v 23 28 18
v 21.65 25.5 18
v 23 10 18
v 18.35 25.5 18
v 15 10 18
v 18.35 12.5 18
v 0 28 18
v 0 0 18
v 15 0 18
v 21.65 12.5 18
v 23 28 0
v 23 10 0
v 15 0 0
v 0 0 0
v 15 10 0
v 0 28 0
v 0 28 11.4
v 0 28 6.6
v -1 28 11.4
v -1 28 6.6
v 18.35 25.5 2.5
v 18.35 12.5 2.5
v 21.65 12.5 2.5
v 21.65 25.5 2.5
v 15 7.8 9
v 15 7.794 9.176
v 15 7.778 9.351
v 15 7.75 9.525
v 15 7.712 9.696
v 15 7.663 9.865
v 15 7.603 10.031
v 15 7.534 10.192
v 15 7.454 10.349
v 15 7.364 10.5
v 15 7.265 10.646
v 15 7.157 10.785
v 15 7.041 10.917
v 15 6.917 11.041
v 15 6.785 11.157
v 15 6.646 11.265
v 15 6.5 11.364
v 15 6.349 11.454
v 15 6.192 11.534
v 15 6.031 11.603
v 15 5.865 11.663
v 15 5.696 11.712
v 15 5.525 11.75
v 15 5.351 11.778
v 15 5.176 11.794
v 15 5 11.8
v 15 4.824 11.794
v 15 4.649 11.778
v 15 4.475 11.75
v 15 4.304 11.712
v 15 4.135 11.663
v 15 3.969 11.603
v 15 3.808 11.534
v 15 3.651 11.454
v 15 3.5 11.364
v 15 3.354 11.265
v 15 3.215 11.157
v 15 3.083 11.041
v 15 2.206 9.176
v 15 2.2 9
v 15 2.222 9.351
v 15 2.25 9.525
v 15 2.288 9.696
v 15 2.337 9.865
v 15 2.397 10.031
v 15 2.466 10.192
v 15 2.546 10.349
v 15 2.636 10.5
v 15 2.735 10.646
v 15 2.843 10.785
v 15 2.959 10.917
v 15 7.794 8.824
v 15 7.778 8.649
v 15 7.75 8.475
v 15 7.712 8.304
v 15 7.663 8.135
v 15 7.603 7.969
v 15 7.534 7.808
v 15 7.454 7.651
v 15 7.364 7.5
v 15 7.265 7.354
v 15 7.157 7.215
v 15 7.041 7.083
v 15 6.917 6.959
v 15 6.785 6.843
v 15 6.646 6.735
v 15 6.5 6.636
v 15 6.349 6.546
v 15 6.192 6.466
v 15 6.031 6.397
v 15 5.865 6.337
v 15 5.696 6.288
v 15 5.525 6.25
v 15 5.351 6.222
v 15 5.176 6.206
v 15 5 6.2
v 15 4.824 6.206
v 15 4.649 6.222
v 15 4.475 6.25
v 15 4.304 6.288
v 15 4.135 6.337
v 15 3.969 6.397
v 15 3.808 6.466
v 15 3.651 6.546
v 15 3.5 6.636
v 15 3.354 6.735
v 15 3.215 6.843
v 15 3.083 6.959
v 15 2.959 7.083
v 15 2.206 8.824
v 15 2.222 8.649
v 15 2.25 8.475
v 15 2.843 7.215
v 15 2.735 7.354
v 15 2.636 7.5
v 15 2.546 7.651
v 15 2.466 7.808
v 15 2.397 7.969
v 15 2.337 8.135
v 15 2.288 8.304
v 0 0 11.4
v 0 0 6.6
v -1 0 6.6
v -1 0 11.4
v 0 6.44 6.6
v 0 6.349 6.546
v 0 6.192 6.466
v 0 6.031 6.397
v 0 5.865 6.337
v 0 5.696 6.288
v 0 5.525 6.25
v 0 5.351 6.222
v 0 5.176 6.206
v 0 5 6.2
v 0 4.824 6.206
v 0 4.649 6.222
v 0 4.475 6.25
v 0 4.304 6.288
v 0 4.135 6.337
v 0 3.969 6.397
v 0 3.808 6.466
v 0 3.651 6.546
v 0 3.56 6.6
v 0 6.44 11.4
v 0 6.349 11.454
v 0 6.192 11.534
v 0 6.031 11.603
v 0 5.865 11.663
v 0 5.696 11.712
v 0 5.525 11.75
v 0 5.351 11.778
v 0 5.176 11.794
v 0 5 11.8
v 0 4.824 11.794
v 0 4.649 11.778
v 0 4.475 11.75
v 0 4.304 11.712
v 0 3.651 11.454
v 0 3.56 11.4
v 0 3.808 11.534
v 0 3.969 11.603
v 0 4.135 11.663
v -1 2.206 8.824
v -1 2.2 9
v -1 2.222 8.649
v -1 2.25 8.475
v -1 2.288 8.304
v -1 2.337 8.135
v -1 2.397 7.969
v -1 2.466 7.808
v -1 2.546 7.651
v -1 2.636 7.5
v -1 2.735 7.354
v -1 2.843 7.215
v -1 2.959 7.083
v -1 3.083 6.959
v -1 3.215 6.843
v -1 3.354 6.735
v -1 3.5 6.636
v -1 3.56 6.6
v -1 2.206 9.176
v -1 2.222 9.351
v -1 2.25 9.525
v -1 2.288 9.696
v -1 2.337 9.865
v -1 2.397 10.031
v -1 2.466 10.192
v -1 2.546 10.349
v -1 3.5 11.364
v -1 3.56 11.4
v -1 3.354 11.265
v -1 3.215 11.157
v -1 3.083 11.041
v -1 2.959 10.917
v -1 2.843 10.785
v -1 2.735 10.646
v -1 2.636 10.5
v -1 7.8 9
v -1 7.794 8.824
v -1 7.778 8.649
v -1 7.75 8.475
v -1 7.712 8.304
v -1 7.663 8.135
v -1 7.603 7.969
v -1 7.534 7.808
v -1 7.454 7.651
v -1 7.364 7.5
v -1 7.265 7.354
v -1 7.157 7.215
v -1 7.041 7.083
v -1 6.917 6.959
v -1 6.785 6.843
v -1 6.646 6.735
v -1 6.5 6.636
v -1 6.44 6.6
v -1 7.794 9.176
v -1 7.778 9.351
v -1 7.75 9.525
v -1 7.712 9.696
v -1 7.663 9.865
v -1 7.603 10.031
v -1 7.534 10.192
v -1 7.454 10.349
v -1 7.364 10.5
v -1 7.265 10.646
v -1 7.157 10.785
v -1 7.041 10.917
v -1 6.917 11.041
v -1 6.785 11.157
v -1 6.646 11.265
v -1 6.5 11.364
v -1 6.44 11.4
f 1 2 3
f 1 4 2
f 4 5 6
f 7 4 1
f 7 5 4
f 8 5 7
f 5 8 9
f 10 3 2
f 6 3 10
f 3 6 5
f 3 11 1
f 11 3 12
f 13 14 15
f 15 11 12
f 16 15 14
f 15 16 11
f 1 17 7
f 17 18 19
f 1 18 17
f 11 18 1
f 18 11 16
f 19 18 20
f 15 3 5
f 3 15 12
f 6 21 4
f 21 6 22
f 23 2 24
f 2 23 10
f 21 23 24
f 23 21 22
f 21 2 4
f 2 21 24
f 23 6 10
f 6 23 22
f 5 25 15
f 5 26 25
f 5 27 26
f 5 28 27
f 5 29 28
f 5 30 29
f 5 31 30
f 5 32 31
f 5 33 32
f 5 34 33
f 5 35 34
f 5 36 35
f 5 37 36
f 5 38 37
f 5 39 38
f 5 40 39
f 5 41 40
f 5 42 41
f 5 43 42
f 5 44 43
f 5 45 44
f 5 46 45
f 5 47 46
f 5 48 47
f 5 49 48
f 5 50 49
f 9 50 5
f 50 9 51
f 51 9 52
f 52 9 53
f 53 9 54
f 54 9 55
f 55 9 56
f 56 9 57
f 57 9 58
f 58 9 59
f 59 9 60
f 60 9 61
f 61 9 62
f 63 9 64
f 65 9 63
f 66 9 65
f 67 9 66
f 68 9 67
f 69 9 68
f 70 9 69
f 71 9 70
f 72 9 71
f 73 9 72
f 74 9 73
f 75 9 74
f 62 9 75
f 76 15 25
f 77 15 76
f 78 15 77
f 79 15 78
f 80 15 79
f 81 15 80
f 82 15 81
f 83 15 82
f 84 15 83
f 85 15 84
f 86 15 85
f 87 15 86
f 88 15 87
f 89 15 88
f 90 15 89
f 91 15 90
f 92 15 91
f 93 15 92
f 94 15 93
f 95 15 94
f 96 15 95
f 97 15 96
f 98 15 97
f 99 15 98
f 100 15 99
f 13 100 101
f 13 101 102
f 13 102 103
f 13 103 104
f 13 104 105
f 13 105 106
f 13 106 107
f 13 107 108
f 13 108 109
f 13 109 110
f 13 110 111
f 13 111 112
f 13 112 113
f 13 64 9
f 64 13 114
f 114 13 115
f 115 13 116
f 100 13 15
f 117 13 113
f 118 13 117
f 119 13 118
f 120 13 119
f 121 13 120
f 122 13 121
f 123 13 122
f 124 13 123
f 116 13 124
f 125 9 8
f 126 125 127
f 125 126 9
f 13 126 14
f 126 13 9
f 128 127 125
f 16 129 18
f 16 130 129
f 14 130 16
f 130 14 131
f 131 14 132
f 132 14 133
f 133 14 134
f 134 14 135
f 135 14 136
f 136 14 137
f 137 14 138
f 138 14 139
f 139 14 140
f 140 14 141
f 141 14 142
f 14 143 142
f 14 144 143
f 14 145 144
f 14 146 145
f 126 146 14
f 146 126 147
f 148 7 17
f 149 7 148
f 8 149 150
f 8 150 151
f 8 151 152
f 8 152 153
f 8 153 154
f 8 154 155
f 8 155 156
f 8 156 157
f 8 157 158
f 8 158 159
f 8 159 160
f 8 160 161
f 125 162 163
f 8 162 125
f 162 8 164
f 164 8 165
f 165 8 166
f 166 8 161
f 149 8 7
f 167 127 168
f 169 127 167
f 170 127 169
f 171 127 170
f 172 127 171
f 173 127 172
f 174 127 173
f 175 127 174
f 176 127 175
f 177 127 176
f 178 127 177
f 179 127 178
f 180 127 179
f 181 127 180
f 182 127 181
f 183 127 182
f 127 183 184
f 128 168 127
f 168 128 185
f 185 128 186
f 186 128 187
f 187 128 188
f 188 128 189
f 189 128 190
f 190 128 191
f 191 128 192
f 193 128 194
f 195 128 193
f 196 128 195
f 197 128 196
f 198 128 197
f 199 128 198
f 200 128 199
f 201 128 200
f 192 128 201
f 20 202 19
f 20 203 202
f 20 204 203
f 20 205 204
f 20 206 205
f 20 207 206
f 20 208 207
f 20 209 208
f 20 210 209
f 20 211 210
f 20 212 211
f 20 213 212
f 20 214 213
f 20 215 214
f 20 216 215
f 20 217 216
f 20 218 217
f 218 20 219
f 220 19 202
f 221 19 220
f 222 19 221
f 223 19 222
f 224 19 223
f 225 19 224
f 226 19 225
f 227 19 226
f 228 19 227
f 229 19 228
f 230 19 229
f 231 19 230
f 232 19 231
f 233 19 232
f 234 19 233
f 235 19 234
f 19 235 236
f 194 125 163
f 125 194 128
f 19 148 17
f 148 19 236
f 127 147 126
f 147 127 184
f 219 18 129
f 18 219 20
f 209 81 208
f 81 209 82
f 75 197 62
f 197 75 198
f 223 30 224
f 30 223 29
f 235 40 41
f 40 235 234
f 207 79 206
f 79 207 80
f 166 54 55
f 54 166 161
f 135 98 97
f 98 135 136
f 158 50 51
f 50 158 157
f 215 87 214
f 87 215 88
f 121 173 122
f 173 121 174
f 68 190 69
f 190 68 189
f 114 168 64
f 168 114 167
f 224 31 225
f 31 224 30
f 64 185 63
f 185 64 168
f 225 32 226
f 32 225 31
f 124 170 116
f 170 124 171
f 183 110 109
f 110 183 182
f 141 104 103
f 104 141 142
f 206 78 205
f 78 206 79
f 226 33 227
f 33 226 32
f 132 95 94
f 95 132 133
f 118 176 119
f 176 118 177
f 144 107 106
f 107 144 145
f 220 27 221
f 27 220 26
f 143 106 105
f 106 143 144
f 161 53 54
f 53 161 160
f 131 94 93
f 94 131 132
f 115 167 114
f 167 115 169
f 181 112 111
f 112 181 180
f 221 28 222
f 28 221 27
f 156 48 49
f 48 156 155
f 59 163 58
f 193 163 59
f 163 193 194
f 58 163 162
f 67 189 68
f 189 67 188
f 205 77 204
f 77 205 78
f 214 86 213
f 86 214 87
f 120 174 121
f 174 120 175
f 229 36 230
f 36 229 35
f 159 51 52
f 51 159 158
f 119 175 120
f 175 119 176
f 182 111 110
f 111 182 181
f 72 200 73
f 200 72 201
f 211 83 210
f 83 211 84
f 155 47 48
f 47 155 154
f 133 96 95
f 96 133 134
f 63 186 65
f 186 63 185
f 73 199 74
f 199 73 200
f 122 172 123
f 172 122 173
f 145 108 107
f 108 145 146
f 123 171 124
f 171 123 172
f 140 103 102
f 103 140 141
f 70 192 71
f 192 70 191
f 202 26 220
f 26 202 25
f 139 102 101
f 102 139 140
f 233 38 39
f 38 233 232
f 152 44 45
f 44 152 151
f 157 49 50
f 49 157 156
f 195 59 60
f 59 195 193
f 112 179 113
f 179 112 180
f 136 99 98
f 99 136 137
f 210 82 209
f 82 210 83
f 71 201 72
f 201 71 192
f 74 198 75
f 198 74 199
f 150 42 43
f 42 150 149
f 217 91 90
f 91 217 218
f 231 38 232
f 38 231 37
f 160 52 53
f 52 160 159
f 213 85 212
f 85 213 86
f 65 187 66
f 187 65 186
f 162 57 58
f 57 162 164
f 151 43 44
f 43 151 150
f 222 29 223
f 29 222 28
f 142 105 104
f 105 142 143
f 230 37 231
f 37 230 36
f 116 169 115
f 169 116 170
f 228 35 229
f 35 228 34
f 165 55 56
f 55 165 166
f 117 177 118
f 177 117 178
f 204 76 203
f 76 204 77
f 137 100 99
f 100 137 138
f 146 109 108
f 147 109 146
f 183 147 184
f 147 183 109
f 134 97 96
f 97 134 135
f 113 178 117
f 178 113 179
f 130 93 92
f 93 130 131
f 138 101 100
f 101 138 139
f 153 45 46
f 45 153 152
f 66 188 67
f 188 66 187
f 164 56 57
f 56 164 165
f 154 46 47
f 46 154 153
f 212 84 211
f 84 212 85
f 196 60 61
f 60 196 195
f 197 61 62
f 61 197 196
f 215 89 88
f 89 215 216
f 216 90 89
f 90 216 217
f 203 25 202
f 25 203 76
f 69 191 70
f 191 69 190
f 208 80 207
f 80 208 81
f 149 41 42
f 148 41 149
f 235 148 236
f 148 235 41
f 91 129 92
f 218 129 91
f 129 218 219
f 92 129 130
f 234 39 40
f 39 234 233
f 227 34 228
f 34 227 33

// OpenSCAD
// file: part-lib.scad
module BeltRecess(){
    hull(){
        translate([107, 0, 0]) cylinder(d = 52, h= 50);
        translate([33, 0, 0]) cylinder(d = 34, h= 50);
    }
}



module ScrewSlot(diameter, width, length){
    hull(){
        cylinder(d = diameter, h = length);
        translate([0, width]) cylinder(d = diameter, h = length);
    }
}

module FixedLeadScrewBushing(){  
    rotate([0, -90, 0]) translate([0, 0, 0]) union(){
        translate([0, 0, -10]) intersection(){
            cylinder(d = 54, h= 20, center = true);
            cube([46, 46, 20], center = true);
        }
        
        translate([0, 0, 0]) cylinder(d = 36, h = 18);
        translate([0, 0, 18]) cylinder(d = 18, h = 100);
        
        for(i = [45:90:315]){
            screwRadius = 22;
            translate([screwRadius * sin(i), screwRadius * cos(i), 0]) cylinder(d = 5.2, h = 116);
        }
    }
}

module SupportLeadScrewBushing(){  
    rotate([-90, 0, 90]) translate([-21, -27, -20]) union(){
        intersection(){
            translate([21, 27, 0]) cylinder(d = 54, h= 20);
            cube([42, 60, 20]);
        }
        
        translate([21, 27, 20]) cylinder(d = 36, h = 7);
        translate([21, 27, 7]) cylinder(d = 16, h = 100);
        
        translate([6, 12, 7]) cylinder(d = 5.2, h = 116);
        translate([36, 42, 7]) cylinder(d = 5.2, h = 116);
        translate([6, 42, 7]) cylinder(d = 5.2, h = 116);
        translate([36, 12, 7]) cylinder(d = 5.2, h = 116);
    }
}

module NEMA24MotorMount(slidePlay){
    union(){
        cube([102, 62 + slidePlay, 62]);
        
        translate([102, 7.5, 7.5]) rotate([0, 90, 0]) {
            ScrewSlot(5, slidePlay, 100);
        }
        
        translate([102, (62 + slidePlay) - 7.5, 7.5]) rotate([0, 270, 180]) {
            ScrewSlot(5, slidePlay, 100);
        }
        
        translate([102, (62 + slidePlay) - 7.5, 62 - 7.5]) rotate([0, 270, 180]) {
            ScrewSlot(5, slidePlay, 100);
        }
        
        translate([102, 7.5, 62 - 7.5]) rotate([0, 90, 0]) {
            ScrewSlot(5, slidePlay, 100);
        }
        
        translate([102, 31, 31]) rotate([0, 90, 0]) {
            ScrewSlot(40, slidePlay, 100);
        }
    }
}

module TSlotGuide(length, guideCount){
    translate([0, 0, 0.5]){
        for (index = [0: guideCount - 1]) {
            translate([(length / 2), 10 + (index * 20), 0]) cube([length, 4.8, 1], center = true);
        }
    }
}

module LimitSensorMount(){
    translate([0, 0, 0]) difference(){
        union(){
            cube([32, 20, 5]);
        }
        
        translate([2.5, 1.5, 3.5]) cube([27, 17, 2]);
        
        translate([25.5, 10, -50]) cylinder(d = 3.8, h = 100);
    }
}

module CompactLimitSensorMount(){
    translate([0, 0, 0]) difference(){
        union(){
            cube([27, 20, 5]);
        }
        
        translate([0, 1.5, 3.5]) cube([27, 17, 2]);
        
        translate([20.5, 10, -50]) cylinder(d = 3.8, h = 100);
    }
}

module MagnetHolder(){
    translate([0, 0, 0]) difference(){
        union(){
            cube([18, 18, 6]);
        }
        
        translate([2.5, 2.5, 1.35]) cube([19, 13, 3.3]);
    }
}
// main file
$fn = 100;
include <part-lib.scad>

module XMagnetMount(){
    translate([0, 0, 18]) rotate([270, 0, 0]) difference(){
        union(){
            cube([15, 18, 28]);
            translate([0, -1, 0]) rotate([0, 270, 0]) TSlotGuide(28, 1);
            translate([15, 0, 10]) cube([2, 18, 18]);
            translate([23, 18, 10]) rotate([90, 0, -90]) MagnetHolder();
        }
        
        translate([-10, 9, 5]) rotate([0, 90, 0]) cylinder(d = 5.6, h = 40);
    }
}

XMagnetMount();
